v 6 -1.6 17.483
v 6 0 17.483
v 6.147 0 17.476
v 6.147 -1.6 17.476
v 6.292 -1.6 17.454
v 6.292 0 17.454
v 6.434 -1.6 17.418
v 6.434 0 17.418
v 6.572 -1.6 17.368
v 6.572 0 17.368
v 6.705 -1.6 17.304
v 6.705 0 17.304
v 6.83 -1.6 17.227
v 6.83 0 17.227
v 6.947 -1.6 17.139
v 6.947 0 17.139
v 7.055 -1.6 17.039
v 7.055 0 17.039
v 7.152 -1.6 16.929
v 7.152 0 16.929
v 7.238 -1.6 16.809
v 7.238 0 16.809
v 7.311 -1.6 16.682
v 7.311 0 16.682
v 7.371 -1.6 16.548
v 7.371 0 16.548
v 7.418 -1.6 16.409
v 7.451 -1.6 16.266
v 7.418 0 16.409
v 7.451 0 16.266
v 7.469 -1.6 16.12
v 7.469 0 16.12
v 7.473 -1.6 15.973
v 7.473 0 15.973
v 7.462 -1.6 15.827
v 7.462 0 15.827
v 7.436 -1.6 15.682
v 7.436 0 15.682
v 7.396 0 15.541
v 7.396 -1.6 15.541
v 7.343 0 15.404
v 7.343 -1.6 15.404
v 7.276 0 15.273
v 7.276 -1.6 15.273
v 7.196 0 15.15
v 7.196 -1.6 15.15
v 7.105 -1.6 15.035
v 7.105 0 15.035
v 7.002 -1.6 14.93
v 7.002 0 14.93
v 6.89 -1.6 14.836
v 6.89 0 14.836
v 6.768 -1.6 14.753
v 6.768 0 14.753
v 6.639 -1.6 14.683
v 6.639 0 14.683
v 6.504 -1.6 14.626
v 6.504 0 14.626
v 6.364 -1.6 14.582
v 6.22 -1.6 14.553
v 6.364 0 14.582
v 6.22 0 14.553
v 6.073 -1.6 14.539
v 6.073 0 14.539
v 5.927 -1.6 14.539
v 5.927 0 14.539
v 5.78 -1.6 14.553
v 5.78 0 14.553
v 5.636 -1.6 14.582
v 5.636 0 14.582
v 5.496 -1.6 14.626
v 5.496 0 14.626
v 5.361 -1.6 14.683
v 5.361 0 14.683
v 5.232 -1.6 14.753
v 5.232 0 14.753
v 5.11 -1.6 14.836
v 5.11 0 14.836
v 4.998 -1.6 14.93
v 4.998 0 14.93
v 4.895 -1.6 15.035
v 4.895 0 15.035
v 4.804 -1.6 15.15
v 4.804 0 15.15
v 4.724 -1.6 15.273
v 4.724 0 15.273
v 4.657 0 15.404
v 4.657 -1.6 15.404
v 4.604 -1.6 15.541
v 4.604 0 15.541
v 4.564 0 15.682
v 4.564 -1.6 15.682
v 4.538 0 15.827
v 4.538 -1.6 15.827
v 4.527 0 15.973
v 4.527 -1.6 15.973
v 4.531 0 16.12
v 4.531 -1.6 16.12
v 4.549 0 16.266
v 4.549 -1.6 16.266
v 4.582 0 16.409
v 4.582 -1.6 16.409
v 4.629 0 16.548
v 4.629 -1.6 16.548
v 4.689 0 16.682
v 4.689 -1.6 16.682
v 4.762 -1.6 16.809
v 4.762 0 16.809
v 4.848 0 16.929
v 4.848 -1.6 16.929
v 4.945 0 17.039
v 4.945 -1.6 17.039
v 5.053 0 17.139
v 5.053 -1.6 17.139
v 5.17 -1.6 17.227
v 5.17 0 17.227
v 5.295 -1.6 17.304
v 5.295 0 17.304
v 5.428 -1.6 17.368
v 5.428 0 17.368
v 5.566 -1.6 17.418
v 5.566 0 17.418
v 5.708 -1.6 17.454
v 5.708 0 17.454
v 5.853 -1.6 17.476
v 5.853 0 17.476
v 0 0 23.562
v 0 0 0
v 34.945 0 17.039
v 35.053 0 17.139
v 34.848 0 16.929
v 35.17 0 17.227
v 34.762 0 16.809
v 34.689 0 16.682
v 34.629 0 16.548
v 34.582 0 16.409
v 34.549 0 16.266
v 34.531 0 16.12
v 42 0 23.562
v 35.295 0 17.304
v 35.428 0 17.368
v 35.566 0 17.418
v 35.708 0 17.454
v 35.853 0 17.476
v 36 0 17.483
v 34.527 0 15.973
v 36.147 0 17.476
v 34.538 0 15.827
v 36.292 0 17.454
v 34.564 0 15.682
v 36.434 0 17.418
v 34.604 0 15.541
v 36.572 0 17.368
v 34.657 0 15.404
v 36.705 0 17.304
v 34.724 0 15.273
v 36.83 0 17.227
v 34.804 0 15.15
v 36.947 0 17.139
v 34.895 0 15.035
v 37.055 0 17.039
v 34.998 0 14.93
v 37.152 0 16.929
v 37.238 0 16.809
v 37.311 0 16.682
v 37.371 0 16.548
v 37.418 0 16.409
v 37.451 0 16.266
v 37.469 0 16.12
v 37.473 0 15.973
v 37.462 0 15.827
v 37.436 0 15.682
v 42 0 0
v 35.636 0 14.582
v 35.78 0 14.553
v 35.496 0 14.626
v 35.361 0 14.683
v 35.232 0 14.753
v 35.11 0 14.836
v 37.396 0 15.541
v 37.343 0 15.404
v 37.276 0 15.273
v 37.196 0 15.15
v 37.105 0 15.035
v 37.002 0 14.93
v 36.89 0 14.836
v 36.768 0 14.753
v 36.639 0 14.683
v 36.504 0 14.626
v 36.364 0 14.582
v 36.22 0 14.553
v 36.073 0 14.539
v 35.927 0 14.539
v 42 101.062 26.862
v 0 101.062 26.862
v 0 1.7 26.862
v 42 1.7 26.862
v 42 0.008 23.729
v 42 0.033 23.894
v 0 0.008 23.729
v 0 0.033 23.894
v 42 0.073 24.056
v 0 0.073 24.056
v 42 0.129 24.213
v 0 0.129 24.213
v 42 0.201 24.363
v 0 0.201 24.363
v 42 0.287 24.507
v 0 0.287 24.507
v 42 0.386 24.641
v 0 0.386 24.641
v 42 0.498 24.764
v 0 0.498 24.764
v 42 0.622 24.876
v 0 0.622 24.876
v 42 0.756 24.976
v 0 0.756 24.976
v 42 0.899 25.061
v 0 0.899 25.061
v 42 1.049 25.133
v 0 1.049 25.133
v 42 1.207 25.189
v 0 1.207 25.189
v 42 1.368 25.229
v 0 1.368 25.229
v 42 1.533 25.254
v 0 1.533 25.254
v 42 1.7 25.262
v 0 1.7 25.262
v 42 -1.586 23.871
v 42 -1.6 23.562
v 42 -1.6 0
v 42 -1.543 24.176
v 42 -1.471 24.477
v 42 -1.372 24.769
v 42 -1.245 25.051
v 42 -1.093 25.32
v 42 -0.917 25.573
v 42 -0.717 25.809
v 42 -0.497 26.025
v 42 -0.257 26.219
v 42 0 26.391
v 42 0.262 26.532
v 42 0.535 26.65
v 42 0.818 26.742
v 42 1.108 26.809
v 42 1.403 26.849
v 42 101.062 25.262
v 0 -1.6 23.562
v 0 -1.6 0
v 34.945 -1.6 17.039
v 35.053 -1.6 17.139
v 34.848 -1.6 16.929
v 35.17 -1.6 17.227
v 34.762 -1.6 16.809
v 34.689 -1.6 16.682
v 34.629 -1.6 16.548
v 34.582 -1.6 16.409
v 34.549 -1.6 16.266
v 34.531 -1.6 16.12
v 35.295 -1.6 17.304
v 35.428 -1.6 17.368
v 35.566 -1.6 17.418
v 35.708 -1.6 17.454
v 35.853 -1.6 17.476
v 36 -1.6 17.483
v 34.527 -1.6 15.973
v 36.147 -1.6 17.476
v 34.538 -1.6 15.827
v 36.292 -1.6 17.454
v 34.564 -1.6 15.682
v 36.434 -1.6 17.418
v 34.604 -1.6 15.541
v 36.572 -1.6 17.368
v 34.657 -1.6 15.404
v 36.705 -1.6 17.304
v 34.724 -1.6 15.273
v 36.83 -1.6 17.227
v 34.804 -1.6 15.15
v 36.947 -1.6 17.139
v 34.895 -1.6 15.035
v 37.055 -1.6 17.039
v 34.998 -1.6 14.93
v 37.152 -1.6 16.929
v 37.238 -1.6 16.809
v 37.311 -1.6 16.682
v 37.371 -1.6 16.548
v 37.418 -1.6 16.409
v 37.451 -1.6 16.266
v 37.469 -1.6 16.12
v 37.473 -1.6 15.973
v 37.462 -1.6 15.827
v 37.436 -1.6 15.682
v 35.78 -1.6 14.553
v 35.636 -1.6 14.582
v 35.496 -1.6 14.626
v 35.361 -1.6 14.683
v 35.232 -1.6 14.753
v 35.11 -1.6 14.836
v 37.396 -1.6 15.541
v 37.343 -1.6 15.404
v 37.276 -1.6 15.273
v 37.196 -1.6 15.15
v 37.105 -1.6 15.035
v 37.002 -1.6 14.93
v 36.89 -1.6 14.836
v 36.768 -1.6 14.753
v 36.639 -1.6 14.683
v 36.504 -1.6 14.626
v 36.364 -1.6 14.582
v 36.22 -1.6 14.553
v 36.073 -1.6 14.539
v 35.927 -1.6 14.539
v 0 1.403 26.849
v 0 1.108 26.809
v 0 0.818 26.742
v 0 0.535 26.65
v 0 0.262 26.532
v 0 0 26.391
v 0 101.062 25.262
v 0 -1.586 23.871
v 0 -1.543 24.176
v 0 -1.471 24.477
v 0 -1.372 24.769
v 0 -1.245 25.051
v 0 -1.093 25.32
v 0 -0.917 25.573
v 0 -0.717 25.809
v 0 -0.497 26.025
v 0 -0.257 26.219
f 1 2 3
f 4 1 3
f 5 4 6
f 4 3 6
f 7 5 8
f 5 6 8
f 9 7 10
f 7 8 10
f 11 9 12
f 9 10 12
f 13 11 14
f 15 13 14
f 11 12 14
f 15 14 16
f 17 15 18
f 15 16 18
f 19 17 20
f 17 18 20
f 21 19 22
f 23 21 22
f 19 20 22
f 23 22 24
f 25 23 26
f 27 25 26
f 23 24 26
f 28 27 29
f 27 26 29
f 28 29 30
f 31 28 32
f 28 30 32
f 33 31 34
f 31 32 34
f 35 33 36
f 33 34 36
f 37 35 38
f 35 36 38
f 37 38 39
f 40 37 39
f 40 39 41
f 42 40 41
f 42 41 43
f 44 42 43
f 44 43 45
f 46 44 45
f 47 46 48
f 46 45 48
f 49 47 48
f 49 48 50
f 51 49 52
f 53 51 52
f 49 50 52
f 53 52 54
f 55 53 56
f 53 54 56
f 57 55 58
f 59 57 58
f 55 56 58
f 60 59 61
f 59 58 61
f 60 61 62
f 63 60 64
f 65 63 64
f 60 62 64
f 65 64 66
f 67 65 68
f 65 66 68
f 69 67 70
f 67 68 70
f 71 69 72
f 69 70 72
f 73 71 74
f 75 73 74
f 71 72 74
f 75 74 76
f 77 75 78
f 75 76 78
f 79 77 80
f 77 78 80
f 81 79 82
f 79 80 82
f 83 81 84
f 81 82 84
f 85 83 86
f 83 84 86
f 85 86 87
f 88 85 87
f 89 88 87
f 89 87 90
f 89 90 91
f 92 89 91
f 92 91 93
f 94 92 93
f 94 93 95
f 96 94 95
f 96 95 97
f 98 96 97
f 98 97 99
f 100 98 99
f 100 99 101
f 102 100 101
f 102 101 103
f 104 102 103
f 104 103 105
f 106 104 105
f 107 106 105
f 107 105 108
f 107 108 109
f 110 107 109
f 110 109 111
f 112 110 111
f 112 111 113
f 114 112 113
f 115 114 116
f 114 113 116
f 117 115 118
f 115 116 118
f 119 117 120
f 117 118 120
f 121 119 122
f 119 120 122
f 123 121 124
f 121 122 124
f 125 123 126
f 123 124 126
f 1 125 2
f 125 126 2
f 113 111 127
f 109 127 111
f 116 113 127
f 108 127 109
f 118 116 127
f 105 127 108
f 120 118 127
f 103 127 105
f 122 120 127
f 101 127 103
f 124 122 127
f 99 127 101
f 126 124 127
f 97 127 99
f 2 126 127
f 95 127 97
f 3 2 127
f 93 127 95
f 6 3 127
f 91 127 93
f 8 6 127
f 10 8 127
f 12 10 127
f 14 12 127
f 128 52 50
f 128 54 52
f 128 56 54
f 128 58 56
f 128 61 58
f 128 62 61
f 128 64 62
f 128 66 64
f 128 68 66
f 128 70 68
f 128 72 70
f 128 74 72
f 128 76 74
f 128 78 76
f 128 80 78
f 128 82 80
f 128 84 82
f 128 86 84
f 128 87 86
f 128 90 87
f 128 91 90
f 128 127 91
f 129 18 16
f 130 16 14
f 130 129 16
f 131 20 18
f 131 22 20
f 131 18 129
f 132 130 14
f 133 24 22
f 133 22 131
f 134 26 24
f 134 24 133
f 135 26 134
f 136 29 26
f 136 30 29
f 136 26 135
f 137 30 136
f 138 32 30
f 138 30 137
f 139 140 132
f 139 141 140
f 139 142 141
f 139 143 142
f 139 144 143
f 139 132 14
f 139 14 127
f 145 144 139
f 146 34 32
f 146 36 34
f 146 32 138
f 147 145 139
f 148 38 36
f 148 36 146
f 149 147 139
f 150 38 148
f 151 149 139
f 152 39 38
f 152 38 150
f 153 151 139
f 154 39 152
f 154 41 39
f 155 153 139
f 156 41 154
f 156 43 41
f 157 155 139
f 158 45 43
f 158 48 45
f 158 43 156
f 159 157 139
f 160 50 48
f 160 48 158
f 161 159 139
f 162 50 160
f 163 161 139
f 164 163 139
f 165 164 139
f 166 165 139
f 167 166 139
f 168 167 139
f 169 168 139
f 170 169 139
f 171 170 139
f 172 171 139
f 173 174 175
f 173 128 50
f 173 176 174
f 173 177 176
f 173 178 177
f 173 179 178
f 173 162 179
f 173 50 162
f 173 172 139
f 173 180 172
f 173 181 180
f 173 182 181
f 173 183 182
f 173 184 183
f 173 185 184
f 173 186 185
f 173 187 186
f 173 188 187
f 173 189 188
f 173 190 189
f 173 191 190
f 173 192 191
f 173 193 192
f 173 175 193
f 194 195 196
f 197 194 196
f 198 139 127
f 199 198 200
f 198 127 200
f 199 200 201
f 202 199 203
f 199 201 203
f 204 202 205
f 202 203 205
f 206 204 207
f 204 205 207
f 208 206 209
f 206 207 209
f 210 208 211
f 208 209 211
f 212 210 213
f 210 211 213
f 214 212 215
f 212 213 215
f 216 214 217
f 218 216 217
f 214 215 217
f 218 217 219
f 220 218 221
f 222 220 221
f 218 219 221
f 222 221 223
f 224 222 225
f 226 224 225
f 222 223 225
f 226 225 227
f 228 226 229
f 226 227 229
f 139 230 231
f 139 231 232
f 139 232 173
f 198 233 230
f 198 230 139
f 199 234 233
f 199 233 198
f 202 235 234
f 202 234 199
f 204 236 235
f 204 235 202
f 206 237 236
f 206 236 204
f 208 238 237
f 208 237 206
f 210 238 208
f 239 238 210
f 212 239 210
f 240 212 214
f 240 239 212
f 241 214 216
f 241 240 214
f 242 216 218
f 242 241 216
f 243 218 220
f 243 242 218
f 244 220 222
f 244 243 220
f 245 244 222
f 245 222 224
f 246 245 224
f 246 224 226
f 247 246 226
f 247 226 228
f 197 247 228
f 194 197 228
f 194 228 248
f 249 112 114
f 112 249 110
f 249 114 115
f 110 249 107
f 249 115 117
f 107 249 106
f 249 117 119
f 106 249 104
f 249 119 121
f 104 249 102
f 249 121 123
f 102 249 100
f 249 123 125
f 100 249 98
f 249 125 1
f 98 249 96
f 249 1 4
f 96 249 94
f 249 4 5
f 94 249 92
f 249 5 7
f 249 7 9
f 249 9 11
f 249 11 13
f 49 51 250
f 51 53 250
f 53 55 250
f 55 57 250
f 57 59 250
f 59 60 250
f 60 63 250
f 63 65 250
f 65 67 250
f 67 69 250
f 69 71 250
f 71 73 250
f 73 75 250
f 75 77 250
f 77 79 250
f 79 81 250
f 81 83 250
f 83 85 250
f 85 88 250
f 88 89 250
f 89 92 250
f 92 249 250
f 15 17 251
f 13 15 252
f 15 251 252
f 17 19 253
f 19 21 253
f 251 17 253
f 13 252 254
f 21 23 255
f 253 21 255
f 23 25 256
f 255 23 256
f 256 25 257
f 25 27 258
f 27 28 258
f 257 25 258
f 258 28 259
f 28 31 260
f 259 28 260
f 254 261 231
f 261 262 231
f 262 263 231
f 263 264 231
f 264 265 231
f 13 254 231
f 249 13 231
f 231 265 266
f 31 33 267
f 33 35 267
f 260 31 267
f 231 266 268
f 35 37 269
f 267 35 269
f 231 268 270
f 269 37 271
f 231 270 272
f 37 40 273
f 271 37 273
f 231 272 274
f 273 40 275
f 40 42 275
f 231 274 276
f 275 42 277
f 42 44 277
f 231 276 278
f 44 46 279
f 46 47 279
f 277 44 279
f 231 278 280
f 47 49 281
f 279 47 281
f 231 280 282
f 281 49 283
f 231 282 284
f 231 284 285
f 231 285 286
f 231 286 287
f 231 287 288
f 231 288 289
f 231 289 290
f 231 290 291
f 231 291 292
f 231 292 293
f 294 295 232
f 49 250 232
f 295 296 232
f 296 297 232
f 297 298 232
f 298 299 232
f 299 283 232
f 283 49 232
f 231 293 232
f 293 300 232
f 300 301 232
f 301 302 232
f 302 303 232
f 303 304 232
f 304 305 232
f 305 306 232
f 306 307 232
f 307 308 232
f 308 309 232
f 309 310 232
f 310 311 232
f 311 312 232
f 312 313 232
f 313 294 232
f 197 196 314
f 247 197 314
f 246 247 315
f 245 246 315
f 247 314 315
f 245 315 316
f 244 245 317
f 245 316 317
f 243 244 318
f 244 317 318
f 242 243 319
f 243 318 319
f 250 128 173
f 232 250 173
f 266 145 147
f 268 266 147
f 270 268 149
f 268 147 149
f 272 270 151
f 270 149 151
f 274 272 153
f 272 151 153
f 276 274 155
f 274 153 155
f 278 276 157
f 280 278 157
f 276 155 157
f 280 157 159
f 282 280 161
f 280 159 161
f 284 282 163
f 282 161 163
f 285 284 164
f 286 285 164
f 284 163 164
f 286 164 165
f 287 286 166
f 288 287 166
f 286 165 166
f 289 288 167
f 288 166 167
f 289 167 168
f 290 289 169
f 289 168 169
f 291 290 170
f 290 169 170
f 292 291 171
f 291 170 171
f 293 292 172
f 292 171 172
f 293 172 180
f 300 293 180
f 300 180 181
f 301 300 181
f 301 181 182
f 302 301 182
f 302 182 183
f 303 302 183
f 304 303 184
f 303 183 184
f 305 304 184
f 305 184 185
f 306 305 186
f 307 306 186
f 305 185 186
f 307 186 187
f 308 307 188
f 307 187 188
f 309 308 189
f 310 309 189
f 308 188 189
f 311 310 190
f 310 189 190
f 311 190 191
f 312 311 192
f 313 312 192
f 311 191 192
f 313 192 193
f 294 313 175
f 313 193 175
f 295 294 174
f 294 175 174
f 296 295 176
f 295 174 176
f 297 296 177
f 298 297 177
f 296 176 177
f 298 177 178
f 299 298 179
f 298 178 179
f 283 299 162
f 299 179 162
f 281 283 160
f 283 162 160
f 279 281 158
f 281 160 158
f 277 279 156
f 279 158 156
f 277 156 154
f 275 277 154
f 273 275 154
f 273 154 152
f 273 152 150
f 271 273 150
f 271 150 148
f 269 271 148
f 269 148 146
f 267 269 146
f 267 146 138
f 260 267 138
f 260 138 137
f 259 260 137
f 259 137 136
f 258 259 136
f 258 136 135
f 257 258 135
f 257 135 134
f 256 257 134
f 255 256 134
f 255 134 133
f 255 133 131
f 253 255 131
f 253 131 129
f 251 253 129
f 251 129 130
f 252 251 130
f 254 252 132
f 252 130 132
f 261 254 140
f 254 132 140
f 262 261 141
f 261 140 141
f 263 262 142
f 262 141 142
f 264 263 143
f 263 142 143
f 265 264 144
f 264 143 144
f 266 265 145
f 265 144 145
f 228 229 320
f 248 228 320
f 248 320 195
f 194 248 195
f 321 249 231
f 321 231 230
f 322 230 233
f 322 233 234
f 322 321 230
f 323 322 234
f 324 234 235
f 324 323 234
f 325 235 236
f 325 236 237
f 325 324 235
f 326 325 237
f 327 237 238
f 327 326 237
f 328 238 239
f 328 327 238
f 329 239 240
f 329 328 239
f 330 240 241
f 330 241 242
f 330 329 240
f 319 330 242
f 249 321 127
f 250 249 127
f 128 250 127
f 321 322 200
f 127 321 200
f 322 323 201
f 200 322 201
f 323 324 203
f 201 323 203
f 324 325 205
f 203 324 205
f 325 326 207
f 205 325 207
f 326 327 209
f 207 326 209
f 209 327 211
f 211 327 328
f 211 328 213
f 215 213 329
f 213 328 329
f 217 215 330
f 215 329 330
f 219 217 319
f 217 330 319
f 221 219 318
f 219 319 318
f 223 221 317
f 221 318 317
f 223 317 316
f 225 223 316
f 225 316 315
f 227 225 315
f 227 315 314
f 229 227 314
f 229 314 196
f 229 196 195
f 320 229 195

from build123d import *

# Parameters (mm, degrees)
SKETCH1_W              = 42
SKETCH1_H              = 126.6
SKETCH1_R              = 1.4732
BASE_FLANGE1_DEPTH     = 1.6002
SKETCHED_BEND1_DEPTH   = 42
SKETCHED_BEND1_2_DEPTH = 42


# Read off the part's stored shape, not the designer's step: Sketched Bend1
# Sheet-metal steps are written as plain solids
with BuildPart() as part:
    # Sketch1 → Base-Flange1 (new body)
    with BuildSketch(Plane(origin=(0, 0, 0), x_dir=(1, 0, 0), z_dir=(0, 1, 0))):
        with Locations((21, -63.3)):
            Rectangle(SKETCH1_W, SKETCH1_H)
        with Locations(Location((6, -16.01, 0), (0, 0, 270))):
            Circle(SKETCH1_R, mode=Mode.SUBTRACT)
        with Locations(Location((36, -16.01, 0), (0, 0, 270))):
            Circle(SKETCH1_R, mode=Mode.SUBTRACT)
    extrude(amount=-BASE_FLANGE1_DEPTH)

    # Sketched Bend1 outline → Sketched Bend1 (cut)
    with BuildSketch(Plane.YZ):
        with BuildLine():
            ThreePointArc((-1.6002, 23.562105466), (-1.172425807, 25.187063933), (0, 26.390765933))
            Line((0, 26.390765933), (0, 126.6))
            Line((0, 126.6), (-1.6002, 126.6))
            Line((-1.6002, 126.6), (-1.6002, 23.562105466))
        make_face()
    extrude(amount=SKETCHED_BEND1_DEPTH, mode=Mode.SUBTRACT)

    # Sketched Bend1 2 outline → Sketched Bend1 2 (add)
    with BuildSketch(Plane.YZ):
        with BuildLine():
            ThreePointArc((0, 23.562105466), (0.497918472, 24.764186994), (1.7, 25.262105466))
            Line((1.7, 25.262105466), (101.062105466, 25.262105466))
            Line((101.062105466, 25.262105466), (101.062105466, 26.862305466))
            Line((101.062105466, 26.862305466), (1.7, 26.862305466))
            ThreePointArc((1.7, 26.862305466), (0.817907384, 26.742236384), (0, 26.390765933))
            Line((0, 26.390765933), (0, 23.562105466))
        make_face()
    extrude(amount=SKETCHED_BEND1_2_DEPTH)


solid = part.part
